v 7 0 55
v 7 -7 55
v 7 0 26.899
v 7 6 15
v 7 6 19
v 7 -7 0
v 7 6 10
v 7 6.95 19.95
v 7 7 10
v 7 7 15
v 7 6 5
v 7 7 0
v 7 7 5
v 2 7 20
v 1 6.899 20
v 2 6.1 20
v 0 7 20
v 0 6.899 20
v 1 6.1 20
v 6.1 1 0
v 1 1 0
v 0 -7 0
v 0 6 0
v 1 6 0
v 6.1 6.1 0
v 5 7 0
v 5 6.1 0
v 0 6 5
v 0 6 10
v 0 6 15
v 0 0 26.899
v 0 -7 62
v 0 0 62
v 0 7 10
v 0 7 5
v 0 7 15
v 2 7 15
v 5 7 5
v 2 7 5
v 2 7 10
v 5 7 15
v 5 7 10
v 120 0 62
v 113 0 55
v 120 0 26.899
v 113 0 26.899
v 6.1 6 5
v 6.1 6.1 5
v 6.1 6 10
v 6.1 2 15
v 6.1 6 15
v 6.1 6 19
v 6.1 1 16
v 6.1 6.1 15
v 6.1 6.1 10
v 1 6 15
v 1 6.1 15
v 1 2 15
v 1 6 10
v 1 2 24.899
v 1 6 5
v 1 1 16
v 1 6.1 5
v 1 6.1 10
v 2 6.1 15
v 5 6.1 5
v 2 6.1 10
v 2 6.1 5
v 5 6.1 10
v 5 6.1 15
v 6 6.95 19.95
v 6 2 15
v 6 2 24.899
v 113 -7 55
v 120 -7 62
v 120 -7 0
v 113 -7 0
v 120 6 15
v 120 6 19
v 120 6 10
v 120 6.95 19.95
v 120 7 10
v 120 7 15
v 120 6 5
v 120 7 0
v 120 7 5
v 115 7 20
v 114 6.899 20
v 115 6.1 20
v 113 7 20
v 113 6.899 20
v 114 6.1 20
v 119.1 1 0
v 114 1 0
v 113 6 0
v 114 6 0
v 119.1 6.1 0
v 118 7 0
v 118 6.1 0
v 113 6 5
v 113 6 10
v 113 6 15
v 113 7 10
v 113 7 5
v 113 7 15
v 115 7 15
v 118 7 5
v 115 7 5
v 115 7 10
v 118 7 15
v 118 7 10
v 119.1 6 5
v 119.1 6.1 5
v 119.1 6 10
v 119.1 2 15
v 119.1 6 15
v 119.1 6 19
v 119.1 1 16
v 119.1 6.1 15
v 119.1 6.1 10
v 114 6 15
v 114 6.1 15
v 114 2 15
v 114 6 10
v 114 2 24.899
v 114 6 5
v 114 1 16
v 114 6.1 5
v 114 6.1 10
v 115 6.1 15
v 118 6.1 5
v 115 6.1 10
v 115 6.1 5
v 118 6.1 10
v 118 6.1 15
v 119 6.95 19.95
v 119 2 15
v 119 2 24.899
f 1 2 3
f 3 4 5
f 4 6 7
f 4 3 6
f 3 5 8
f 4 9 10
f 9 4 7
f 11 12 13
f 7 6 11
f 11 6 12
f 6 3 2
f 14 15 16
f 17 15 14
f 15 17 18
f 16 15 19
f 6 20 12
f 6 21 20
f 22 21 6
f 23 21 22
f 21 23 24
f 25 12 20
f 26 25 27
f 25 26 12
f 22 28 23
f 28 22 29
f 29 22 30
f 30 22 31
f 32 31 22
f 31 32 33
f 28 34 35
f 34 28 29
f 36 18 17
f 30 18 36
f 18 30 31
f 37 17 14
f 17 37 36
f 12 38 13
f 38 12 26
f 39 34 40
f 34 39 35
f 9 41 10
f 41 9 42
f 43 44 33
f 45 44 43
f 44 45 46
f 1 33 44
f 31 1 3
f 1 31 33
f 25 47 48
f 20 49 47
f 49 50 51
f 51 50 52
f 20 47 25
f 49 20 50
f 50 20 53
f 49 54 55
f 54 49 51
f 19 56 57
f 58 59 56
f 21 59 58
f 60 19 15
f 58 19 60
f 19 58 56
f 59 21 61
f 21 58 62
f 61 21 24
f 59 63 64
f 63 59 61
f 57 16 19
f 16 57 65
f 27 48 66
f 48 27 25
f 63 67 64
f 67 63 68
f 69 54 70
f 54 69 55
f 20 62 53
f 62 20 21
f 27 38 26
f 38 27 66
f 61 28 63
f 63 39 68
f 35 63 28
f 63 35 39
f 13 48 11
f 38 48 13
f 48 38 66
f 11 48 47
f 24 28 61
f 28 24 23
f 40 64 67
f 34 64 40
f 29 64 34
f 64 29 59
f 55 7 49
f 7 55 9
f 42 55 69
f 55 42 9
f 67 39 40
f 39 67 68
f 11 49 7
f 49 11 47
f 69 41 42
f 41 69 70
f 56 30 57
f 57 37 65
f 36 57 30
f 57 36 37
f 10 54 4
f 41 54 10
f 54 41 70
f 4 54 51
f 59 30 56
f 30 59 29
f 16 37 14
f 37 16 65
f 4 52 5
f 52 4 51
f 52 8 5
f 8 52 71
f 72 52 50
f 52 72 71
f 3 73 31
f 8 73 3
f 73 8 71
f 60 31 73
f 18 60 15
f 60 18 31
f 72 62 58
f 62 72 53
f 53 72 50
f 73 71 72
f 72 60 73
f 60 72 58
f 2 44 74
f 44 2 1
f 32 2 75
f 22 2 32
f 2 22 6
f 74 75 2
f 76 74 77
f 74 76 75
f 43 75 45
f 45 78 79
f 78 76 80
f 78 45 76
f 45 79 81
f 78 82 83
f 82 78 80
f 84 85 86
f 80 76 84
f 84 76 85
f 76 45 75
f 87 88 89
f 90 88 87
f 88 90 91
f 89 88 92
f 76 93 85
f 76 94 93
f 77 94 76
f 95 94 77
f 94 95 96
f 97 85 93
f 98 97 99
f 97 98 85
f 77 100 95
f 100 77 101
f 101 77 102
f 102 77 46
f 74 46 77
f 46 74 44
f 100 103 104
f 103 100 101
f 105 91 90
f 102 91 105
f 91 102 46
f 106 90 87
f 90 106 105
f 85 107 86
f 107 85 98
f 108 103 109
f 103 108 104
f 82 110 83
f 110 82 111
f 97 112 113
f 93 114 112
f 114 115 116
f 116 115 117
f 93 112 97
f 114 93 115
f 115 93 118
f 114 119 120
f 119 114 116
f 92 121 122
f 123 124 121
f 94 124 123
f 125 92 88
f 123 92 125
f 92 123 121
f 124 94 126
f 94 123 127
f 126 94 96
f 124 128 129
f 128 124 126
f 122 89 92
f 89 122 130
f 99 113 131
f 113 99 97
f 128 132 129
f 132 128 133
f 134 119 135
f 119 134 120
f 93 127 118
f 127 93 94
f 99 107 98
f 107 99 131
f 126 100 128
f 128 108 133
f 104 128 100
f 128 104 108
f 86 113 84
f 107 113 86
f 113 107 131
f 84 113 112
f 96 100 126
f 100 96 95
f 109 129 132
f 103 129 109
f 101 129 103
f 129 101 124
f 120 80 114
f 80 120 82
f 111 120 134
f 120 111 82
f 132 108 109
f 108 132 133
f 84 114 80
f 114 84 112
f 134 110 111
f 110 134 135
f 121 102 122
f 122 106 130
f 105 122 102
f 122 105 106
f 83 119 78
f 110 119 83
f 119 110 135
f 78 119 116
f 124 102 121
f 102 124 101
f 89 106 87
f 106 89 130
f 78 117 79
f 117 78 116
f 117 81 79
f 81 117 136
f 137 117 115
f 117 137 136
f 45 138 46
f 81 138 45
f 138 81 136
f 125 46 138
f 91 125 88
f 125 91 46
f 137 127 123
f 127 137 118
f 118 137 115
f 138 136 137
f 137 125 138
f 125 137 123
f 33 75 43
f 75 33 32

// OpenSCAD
module clipColumn() {
  union() {
    difference() {
      // Main column cube
      cube([7, 7, 20]);

      // Cut out middle section
      translate([1, 1, 0]) {
        cube([5.1, 5.1, 20]);
      };

      // Cut bottom
      translate([0, 6, 0]) {
        cube([5, 1, 5]);
      };

      // Cut middle
      translate([2, 6, 5]) {
        cube([5, 1, 5]);
      };

      // Cut middle
      translate([0, 6, 10]) {
        cube([5, 1, 5]);
      };

      // Cut top
      translate([2, 6, 15]) {
        cube([5, 1, 5]);
      };
    }

    // Solid column
    translate([0, -7, 0]) {
      cube([7, 7, 15 + 15 + 25]);
    }

    // Make the clips have a 45 degree tilt so it can be printed
    // with the top printed first.
    // Otherwise the slicer would complain about these being cantilevers.
    translate([0, 2, 15]) {
      difference() {
        rotate([45, 0, 0]) {
          cube([7, 7, 10]);
        }
        translate([1, 0, 0]) {
          cube([5, 10, 10]);
        }
      }
    }
  }
}

clipColumn();
translate([0, -7, 15 + 15 + 25]) {
  cube([120, 7, 7]);
}
translate([120 - 7, 0, 0]) {
  clipColumn();
}
